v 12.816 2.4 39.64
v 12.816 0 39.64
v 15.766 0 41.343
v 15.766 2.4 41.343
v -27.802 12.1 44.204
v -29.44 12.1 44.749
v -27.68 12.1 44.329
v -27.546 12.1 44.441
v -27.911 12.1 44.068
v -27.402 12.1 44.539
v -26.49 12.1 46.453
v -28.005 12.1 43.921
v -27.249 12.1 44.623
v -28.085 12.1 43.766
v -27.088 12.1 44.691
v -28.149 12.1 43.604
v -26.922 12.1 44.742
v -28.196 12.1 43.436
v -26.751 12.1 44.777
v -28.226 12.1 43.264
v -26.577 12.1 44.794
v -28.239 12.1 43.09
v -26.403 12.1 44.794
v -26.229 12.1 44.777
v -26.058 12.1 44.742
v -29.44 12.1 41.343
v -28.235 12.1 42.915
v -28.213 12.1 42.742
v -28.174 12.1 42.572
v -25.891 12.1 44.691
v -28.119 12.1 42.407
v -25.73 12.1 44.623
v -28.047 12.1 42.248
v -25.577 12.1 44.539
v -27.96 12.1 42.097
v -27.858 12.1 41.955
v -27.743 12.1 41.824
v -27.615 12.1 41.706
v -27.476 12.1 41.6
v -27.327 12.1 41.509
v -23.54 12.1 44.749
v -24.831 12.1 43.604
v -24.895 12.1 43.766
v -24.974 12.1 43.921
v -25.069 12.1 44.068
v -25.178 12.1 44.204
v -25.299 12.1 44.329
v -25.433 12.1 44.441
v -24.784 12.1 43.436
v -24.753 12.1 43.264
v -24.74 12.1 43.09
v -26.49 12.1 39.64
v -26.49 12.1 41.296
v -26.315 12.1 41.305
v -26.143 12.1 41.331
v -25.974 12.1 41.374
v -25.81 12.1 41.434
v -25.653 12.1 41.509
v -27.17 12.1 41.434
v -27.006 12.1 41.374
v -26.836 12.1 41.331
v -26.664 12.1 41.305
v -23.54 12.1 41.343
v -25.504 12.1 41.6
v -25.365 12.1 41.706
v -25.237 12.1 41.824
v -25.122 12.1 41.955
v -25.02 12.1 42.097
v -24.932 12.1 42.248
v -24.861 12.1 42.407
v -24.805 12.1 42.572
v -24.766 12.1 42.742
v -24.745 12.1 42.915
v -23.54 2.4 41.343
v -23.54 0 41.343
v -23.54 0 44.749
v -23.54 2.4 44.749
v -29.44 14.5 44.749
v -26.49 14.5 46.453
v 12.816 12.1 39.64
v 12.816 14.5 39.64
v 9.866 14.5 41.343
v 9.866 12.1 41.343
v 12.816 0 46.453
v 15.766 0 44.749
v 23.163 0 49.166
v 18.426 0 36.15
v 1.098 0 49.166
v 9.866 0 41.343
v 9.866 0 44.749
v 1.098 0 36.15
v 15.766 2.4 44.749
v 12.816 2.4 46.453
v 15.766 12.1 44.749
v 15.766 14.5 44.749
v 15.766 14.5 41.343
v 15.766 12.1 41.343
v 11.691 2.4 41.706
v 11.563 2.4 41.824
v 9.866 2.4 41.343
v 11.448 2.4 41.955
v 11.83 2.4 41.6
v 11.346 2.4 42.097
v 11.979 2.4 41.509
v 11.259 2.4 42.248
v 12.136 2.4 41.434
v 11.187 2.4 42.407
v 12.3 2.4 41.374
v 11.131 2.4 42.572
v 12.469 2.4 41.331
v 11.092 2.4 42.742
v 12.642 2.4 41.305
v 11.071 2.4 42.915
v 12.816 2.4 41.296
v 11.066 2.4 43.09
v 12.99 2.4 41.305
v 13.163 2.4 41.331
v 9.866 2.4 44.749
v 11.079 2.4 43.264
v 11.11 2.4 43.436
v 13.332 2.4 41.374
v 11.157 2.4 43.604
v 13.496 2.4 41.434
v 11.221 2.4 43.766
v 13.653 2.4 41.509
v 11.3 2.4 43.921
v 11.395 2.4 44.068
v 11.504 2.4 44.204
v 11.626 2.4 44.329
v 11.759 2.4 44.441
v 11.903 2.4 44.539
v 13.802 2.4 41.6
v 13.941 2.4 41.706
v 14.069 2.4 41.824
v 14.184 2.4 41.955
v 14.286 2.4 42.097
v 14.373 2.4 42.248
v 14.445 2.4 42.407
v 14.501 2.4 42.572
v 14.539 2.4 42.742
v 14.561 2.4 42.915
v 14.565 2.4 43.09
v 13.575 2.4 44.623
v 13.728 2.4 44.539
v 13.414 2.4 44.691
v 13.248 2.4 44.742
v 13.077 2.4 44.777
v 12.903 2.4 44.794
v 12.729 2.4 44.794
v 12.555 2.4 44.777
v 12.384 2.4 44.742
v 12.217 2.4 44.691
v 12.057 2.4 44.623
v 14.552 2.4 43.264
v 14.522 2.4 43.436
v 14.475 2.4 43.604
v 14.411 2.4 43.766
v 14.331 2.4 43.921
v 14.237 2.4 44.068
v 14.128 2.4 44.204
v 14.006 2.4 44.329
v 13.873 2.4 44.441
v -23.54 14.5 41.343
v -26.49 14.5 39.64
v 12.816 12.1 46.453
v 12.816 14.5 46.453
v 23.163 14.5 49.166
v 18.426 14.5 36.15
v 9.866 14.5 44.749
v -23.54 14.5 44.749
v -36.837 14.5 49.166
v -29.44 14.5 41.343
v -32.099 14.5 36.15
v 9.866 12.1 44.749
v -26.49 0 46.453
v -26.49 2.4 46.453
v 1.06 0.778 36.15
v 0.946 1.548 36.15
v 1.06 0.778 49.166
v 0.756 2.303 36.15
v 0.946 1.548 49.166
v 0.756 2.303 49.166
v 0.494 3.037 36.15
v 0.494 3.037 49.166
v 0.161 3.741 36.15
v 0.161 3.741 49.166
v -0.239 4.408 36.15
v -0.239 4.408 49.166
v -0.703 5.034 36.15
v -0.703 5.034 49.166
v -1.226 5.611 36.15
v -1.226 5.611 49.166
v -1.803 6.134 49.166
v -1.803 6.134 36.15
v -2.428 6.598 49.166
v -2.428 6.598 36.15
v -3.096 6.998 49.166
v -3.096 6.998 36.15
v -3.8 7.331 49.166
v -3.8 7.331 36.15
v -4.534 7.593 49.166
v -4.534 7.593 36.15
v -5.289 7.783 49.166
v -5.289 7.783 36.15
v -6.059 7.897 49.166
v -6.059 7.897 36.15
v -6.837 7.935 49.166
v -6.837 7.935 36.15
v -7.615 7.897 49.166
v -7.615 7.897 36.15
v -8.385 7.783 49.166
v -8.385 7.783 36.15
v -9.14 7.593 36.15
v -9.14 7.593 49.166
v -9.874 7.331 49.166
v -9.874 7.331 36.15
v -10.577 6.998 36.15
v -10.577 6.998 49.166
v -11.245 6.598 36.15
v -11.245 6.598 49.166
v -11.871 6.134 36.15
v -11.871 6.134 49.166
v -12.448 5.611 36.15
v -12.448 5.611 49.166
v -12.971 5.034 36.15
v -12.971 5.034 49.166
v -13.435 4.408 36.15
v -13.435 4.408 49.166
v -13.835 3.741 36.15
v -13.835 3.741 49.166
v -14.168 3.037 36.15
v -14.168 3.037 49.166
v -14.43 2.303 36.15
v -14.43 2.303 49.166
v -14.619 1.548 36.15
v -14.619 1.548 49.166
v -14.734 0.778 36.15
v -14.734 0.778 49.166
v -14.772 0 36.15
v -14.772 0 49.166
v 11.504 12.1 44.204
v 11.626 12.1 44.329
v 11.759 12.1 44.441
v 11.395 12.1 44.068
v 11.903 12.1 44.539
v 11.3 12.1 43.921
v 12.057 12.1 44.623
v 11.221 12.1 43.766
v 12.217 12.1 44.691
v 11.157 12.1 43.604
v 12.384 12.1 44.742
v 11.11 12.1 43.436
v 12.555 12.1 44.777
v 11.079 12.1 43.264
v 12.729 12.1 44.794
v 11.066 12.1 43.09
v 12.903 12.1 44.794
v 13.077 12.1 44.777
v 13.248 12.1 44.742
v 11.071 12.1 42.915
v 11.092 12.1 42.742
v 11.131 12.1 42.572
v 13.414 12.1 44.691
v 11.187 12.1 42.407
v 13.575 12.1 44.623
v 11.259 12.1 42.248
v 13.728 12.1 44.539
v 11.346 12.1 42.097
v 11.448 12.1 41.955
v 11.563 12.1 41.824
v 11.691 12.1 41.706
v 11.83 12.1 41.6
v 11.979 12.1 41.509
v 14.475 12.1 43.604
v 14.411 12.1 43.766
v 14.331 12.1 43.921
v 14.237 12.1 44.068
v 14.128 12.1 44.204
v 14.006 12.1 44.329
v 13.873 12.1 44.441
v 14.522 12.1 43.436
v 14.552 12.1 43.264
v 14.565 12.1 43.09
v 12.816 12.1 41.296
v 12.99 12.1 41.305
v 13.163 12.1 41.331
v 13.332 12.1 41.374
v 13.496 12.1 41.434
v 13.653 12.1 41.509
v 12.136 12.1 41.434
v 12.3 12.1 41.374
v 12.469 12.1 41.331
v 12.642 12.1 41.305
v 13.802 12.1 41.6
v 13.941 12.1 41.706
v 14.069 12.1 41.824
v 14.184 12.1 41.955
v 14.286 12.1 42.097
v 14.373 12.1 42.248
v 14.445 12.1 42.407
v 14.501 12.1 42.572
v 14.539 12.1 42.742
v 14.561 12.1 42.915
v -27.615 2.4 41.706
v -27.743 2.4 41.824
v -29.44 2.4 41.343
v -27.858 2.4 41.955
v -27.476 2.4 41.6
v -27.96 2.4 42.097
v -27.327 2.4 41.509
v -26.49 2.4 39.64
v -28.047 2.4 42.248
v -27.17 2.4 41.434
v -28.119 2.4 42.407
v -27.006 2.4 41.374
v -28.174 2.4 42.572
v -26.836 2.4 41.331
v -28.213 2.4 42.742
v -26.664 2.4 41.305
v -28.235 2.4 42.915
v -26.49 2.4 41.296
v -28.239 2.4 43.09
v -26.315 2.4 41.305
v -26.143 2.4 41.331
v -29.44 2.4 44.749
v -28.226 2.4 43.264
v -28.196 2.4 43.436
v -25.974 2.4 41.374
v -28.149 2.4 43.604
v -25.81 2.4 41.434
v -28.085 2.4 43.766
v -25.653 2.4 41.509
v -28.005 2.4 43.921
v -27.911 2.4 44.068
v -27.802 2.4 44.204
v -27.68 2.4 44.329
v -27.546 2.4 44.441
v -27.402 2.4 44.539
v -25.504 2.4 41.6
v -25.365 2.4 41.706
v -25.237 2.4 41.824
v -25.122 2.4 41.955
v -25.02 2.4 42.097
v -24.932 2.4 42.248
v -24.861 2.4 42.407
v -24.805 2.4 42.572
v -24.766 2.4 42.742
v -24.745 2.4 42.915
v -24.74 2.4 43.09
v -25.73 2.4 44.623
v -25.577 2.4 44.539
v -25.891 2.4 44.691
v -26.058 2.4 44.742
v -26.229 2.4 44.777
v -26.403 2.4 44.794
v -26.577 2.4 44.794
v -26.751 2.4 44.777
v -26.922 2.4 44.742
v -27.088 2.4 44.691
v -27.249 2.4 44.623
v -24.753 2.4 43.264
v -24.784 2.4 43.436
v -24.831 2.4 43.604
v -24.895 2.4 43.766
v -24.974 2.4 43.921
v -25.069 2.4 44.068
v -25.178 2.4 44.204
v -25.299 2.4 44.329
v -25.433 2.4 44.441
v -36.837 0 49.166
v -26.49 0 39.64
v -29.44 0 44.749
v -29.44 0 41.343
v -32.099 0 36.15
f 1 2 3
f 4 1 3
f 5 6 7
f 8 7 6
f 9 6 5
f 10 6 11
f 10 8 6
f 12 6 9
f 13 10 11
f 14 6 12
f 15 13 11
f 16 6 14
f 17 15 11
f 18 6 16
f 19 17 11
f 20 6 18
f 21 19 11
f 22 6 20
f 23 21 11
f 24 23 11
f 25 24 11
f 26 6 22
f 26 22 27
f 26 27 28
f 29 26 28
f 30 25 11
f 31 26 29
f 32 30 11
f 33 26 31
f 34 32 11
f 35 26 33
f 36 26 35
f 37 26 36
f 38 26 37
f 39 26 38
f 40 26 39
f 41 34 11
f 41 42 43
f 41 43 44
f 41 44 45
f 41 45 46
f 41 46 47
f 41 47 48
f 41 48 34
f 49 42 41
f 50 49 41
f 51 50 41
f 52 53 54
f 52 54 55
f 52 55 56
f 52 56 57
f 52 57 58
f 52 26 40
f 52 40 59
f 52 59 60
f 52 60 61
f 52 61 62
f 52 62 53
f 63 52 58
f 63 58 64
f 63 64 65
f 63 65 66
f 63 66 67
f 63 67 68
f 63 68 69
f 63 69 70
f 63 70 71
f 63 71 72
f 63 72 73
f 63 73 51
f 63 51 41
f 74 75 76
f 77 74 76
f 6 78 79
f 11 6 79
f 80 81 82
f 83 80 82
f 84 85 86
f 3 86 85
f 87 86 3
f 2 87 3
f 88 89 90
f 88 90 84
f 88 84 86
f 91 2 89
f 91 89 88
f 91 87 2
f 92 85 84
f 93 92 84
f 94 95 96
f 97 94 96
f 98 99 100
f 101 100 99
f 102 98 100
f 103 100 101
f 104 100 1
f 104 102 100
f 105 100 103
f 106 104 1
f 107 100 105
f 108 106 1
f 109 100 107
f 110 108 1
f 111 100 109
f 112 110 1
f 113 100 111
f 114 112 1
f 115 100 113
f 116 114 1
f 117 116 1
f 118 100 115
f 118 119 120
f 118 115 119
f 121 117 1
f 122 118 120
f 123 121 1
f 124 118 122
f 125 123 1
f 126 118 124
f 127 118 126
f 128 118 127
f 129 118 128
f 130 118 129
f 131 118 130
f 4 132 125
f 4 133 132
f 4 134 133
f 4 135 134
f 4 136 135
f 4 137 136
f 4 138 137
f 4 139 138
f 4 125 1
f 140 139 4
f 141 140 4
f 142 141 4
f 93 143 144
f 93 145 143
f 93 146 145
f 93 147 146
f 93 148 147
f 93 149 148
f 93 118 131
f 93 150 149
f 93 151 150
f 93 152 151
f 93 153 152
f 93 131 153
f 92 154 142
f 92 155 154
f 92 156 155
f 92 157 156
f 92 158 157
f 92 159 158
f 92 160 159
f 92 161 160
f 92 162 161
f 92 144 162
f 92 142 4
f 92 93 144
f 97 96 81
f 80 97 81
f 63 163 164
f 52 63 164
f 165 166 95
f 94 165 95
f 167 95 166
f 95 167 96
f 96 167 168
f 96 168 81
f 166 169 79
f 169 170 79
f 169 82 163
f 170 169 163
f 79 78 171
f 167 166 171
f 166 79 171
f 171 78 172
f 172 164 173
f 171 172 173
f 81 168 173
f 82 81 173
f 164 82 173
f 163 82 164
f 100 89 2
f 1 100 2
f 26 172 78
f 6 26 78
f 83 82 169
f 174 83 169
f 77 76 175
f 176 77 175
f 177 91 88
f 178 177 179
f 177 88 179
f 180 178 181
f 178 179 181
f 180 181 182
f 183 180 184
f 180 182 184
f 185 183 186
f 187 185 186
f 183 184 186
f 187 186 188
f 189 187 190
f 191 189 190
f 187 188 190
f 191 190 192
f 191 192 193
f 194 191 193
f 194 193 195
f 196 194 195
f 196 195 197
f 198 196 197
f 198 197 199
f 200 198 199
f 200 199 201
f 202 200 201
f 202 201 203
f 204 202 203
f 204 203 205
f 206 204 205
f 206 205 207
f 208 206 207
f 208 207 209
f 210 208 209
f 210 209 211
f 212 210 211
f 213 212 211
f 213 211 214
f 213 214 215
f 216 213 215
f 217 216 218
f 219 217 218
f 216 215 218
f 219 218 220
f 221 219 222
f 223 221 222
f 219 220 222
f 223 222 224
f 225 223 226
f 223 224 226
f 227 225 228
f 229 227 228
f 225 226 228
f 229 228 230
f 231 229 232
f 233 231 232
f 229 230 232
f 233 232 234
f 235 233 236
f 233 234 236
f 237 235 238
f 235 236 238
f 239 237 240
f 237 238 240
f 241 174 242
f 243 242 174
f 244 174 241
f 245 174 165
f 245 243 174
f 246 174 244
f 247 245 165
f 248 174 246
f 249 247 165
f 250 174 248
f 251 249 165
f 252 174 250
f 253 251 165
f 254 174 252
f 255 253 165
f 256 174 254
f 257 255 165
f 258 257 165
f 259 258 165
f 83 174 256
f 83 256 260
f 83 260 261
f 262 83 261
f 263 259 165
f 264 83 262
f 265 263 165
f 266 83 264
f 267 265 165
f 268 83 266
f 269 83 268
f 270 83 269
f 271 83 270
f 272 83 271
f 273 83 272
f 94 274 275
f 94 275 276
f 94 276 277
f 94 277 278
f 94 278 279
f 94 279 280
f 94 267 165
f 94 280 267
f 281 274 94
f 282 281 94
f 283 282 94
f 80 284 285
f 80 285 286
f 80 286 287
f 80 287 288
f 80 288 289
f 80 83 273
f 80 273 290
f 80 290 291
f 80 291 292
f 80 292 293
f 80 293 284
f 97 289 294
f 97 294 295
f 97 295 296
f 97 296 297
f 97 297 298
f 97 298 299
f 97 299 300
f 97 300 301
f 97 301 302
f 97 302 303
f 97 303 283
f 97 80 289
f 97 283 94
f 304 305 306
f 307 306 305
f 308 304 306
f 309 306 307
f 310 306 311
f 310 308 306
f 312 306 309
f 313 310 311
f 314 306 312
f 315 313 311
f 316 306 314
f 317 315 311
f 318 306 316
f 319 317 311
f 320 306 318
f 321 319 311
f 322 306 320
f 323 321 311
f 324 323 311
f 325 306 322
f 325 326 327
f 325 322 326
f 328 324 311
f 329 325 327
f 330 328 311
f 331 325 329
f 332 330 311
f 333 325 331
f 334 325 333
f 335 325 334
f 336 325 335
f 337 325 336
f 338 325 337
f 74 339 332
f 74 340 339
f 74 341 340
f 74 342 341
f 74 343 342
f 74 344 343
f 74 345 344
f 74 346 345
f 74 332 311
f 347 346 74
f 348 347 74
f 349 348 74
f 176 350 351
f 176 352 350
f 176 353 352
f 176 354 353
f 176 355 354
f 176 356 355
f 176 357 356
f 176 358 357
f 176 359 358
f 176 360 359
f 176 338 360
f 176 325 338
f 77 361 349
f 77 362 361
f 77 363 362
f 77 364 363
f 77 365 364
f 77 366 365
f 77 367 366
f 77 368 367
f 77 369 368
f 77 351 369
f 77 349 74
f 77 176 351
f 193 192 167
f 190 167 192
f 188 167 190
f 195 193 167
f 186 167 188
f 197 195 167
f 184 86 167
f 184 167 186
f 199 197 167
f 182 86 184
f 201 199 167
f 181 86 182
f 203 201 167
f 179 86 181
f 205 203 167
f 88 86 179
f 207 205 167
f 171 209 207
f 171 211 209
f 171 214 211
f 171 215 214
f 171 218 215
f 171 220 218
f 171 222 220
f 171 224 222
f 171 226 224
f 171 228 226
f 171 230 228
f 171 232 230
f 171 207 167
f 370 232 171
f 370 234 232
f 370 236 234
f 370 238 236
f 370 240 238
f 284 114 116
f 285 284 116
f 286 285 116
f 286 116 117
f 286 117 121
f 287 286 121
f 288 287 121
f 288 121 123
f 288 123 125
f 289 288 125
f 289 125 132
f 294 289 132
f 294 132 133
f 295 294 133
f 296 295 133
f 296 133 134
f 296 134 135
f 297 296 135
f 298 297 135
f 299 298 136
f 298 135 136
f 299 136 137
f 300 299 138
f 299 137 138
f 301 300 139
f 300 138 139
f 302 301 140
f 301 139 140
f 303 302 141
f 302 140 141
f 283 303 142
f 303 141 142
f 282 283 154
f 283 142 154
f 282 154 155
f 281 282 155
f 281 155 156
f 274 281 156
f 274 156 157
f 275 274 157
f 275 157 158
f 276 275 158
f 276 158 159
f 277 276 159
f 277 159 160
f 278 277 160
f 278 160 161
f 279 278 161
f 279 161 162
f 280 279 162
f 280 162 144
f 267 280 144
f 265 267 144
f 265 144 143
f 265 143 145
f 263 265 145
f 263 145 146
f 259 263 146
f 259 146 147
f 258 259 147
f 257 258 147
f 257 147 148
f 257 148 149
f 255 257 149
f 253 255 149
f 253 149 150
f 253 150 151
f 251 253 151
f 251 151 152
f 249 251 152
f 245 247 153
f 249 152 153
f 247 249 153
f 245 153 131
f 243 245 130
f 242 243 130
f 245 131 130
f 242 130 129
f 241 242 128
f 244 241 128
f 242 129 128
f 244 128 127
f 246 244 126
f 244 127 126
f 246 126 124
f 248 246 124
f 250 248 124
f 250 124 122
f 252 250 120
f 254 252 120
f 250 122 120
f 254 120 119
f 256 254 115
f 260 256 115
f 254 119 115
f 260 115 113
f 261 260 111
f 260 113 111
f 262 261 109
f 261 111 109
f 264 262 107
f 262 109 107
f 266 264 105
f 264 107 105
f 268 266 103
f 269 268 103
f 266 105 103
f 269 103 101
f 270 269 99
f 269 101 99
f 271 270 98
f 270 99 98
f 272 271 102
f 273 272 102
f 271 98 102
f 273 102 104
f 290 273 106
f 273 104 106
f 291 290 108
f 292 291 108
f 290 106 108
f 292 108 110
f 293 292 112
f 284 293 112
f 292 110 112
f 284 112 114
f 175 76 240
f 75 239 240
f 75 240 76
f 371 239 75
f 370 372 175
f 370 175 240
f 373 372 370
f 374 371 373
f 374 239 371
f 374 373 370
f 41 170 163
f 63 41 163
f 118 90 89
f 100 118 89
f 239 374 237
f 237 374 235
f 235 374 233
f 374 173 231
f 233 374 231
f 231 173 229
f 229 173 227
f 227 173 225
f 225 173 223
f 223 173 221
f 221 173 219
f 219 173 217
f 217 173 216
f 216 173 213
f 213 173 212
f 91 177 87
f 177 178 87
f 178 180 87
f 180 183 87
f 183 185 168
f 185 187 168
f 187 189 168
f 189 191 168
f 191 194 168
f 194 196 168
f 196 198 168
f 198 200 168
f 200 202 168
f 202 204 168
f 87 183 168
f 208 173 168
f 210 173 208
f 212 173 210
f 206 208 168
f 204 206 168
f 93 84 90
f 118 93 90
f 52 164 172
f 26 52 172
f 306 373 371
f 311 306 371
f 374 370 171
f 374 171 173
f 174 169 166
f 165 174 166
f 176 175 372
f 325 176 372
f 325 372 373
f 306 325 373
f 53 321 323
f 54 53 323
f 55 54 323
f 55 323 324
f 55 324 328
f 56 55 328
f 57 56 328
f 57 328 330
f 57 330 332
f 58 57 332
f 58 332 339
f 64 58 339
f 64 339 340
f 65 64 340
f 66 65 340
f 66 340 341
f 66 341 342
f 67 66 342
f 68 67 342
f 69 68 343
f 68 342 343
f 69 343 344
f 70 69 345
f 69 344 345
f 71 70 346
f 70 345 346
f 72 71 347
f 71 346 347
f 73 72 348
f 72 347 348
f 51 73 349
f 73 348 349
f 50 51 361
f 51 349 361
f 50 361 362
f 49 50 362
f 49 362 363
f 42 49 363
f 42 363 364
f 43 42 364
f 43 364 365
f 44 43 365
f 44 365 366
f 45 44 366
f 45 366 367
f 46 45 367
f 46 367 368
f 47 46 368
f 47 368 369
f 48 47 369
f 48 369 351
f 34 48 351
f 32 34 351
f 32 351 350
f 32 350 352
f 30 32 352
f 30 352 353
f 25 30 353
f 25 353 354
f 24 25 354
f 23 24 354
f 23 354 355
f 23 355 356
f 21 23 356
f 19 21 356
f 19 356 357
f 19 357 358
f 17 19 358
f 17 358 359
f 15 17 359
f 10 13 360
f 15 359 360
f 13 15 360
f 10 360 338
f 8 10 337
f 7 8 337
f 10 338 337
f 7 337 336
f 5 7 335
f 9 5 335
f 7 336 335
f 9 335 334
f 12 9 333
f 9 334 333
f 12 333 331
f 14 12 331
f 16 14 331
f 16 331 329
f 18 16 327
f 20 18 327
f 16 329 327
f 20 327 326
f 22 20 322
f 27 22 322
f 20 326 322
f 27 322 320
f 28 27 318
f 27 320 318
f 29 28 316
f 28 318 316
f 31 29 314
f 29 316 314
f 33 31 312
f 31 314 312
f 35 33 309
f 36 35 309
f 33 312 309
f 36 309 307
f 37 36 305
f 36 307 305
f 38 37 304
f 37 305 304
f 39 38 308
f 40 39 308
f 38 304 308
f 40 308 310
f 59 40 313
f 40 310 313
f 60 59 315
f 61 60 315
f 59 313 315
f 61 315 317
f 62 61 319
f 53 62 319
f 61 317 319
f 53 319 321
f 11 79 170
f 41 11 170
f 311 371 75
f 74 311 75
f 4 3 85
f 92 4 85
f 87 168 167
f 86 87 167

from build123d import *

# Parameters (mm, degrees)
BOSS_EXTRUDE3_DEPTH   = 14.5
SKETCH8_R             = 7.935
CUT_EXTRUDE3_DEPTH    = 88
CUT_EXTRUDE7_DEPTH    = 2.4
CUT_EXTRUDE8_DEPTH    = 2.4
F_1_0MM_DOWEL_HOLE1_D = 3.5
CUT_EXTRUDE10_DEPTH   = 22.4


with BuildPart() as part:
    # Sketch6 → Boss-Extrude3 (new body)
    with BuildSketch(Plane(origin=(0, 0, 0), x_dir=(1, 0, 0), z_dir=(0, 1, 0))):
        Polygon((-21.836914056, -7.954033585), (8.163085944, -7.954033585), (23.163085944, -49.166194877), (-36.836914056, -49.166194877), align=None)
    extrude(amount=BOSS_EXTRUDE3_DEPTH)

    # Sketch8 → Cut-Extrude3 (cut)
    with BuildSketch(Plane.XY.offset(49.166194877)):
        with Locations((-6.836914056, 0)):
            Circle(SKETCH8_R)
    extrude(amount=-CUT_EXTRUDE3_DEPTH, mode=Mode.SUBTRACT)

    # Sketch16 → Cut-Extrude7 (cut)
    with BuildSketch(Plane(origin=(0, 14.5, 0), x_dir=(1, 0, 0), z_dir=(0, 1, 0))):
        Polygon((-26.489739818, -46.452561466), (-23.539739818, -44.749378171), (-23.539739818, -41.343011583), (-26.489739818, -39.639828289), (-29.439739818, -41.343011583), (-29.439739818, -44.749378171), align=None)
        Polygon((12.815911706, -46.452561466), (15.765911706, -44.749378171), (15.765911706, -41.343011583), (12.815911706, -39.639828289), (9.865911706, -41.343011583), (9.865911706, -44.749378171), align=None)
    extrude(amount=-CUT_EXTRUDE7_DEPTH, mode=Mode.SUBTRACT)

    # Sketch17 → Cut-Extrude8 (cut)
    with BuildSketch(Plane.XZ):
        Polygon((-26.489739818, 39.639828289), (-23.539739818, 41.343011583), (-23.539739818, 44.749378171), (-26.489739818, 46.452561466), (-29.439739818, 44.749378171), (-29.439739818, 41.343011583), align=None)
        Polygon((12.815911706, 39.639828289), (15.765911706, 41.343011583), (15.765911706, 44.749378171), (12.815911706, 46.452561466), (9.865911706, 44.749378171), (9.865911706, 41.343011583), align=None)
    extrude(amount=-CUT_EXTRUDE8_DEPTH, mode=Mode.SUBTRACT)

    # Ø1.0mm Dowel Hole1 (through all)
    with Locations(Plane(origin=(-26.489739818, 14.5, 43.046194877), x_dir=(0, 0, 1), z_dir=(0, 1, 0))):
        with Locations((0, 0), (0, 39.305651524)):
            Hole(F_1_0MM_DOWEL_HOLE1_D / 2)

    # Sketch20 → Cut-Extrude10 (cut)
    with BuildSketch(Plane(origin=(0, 14.5, 0), x_dir=(1, 0, 0), z_dir=(0, 1, 0))):
        Polygon((-32.09934406, -36.149828289), (18.425515948, -36.149828289), (8.163085944, -7.954033585), (-21.836914056, -7.954033585), align=None)
    extrude(amount=-CUT_EXTRUDE10_DEPTH, mode=Mode.SUBTRACT)


solid = part.part
